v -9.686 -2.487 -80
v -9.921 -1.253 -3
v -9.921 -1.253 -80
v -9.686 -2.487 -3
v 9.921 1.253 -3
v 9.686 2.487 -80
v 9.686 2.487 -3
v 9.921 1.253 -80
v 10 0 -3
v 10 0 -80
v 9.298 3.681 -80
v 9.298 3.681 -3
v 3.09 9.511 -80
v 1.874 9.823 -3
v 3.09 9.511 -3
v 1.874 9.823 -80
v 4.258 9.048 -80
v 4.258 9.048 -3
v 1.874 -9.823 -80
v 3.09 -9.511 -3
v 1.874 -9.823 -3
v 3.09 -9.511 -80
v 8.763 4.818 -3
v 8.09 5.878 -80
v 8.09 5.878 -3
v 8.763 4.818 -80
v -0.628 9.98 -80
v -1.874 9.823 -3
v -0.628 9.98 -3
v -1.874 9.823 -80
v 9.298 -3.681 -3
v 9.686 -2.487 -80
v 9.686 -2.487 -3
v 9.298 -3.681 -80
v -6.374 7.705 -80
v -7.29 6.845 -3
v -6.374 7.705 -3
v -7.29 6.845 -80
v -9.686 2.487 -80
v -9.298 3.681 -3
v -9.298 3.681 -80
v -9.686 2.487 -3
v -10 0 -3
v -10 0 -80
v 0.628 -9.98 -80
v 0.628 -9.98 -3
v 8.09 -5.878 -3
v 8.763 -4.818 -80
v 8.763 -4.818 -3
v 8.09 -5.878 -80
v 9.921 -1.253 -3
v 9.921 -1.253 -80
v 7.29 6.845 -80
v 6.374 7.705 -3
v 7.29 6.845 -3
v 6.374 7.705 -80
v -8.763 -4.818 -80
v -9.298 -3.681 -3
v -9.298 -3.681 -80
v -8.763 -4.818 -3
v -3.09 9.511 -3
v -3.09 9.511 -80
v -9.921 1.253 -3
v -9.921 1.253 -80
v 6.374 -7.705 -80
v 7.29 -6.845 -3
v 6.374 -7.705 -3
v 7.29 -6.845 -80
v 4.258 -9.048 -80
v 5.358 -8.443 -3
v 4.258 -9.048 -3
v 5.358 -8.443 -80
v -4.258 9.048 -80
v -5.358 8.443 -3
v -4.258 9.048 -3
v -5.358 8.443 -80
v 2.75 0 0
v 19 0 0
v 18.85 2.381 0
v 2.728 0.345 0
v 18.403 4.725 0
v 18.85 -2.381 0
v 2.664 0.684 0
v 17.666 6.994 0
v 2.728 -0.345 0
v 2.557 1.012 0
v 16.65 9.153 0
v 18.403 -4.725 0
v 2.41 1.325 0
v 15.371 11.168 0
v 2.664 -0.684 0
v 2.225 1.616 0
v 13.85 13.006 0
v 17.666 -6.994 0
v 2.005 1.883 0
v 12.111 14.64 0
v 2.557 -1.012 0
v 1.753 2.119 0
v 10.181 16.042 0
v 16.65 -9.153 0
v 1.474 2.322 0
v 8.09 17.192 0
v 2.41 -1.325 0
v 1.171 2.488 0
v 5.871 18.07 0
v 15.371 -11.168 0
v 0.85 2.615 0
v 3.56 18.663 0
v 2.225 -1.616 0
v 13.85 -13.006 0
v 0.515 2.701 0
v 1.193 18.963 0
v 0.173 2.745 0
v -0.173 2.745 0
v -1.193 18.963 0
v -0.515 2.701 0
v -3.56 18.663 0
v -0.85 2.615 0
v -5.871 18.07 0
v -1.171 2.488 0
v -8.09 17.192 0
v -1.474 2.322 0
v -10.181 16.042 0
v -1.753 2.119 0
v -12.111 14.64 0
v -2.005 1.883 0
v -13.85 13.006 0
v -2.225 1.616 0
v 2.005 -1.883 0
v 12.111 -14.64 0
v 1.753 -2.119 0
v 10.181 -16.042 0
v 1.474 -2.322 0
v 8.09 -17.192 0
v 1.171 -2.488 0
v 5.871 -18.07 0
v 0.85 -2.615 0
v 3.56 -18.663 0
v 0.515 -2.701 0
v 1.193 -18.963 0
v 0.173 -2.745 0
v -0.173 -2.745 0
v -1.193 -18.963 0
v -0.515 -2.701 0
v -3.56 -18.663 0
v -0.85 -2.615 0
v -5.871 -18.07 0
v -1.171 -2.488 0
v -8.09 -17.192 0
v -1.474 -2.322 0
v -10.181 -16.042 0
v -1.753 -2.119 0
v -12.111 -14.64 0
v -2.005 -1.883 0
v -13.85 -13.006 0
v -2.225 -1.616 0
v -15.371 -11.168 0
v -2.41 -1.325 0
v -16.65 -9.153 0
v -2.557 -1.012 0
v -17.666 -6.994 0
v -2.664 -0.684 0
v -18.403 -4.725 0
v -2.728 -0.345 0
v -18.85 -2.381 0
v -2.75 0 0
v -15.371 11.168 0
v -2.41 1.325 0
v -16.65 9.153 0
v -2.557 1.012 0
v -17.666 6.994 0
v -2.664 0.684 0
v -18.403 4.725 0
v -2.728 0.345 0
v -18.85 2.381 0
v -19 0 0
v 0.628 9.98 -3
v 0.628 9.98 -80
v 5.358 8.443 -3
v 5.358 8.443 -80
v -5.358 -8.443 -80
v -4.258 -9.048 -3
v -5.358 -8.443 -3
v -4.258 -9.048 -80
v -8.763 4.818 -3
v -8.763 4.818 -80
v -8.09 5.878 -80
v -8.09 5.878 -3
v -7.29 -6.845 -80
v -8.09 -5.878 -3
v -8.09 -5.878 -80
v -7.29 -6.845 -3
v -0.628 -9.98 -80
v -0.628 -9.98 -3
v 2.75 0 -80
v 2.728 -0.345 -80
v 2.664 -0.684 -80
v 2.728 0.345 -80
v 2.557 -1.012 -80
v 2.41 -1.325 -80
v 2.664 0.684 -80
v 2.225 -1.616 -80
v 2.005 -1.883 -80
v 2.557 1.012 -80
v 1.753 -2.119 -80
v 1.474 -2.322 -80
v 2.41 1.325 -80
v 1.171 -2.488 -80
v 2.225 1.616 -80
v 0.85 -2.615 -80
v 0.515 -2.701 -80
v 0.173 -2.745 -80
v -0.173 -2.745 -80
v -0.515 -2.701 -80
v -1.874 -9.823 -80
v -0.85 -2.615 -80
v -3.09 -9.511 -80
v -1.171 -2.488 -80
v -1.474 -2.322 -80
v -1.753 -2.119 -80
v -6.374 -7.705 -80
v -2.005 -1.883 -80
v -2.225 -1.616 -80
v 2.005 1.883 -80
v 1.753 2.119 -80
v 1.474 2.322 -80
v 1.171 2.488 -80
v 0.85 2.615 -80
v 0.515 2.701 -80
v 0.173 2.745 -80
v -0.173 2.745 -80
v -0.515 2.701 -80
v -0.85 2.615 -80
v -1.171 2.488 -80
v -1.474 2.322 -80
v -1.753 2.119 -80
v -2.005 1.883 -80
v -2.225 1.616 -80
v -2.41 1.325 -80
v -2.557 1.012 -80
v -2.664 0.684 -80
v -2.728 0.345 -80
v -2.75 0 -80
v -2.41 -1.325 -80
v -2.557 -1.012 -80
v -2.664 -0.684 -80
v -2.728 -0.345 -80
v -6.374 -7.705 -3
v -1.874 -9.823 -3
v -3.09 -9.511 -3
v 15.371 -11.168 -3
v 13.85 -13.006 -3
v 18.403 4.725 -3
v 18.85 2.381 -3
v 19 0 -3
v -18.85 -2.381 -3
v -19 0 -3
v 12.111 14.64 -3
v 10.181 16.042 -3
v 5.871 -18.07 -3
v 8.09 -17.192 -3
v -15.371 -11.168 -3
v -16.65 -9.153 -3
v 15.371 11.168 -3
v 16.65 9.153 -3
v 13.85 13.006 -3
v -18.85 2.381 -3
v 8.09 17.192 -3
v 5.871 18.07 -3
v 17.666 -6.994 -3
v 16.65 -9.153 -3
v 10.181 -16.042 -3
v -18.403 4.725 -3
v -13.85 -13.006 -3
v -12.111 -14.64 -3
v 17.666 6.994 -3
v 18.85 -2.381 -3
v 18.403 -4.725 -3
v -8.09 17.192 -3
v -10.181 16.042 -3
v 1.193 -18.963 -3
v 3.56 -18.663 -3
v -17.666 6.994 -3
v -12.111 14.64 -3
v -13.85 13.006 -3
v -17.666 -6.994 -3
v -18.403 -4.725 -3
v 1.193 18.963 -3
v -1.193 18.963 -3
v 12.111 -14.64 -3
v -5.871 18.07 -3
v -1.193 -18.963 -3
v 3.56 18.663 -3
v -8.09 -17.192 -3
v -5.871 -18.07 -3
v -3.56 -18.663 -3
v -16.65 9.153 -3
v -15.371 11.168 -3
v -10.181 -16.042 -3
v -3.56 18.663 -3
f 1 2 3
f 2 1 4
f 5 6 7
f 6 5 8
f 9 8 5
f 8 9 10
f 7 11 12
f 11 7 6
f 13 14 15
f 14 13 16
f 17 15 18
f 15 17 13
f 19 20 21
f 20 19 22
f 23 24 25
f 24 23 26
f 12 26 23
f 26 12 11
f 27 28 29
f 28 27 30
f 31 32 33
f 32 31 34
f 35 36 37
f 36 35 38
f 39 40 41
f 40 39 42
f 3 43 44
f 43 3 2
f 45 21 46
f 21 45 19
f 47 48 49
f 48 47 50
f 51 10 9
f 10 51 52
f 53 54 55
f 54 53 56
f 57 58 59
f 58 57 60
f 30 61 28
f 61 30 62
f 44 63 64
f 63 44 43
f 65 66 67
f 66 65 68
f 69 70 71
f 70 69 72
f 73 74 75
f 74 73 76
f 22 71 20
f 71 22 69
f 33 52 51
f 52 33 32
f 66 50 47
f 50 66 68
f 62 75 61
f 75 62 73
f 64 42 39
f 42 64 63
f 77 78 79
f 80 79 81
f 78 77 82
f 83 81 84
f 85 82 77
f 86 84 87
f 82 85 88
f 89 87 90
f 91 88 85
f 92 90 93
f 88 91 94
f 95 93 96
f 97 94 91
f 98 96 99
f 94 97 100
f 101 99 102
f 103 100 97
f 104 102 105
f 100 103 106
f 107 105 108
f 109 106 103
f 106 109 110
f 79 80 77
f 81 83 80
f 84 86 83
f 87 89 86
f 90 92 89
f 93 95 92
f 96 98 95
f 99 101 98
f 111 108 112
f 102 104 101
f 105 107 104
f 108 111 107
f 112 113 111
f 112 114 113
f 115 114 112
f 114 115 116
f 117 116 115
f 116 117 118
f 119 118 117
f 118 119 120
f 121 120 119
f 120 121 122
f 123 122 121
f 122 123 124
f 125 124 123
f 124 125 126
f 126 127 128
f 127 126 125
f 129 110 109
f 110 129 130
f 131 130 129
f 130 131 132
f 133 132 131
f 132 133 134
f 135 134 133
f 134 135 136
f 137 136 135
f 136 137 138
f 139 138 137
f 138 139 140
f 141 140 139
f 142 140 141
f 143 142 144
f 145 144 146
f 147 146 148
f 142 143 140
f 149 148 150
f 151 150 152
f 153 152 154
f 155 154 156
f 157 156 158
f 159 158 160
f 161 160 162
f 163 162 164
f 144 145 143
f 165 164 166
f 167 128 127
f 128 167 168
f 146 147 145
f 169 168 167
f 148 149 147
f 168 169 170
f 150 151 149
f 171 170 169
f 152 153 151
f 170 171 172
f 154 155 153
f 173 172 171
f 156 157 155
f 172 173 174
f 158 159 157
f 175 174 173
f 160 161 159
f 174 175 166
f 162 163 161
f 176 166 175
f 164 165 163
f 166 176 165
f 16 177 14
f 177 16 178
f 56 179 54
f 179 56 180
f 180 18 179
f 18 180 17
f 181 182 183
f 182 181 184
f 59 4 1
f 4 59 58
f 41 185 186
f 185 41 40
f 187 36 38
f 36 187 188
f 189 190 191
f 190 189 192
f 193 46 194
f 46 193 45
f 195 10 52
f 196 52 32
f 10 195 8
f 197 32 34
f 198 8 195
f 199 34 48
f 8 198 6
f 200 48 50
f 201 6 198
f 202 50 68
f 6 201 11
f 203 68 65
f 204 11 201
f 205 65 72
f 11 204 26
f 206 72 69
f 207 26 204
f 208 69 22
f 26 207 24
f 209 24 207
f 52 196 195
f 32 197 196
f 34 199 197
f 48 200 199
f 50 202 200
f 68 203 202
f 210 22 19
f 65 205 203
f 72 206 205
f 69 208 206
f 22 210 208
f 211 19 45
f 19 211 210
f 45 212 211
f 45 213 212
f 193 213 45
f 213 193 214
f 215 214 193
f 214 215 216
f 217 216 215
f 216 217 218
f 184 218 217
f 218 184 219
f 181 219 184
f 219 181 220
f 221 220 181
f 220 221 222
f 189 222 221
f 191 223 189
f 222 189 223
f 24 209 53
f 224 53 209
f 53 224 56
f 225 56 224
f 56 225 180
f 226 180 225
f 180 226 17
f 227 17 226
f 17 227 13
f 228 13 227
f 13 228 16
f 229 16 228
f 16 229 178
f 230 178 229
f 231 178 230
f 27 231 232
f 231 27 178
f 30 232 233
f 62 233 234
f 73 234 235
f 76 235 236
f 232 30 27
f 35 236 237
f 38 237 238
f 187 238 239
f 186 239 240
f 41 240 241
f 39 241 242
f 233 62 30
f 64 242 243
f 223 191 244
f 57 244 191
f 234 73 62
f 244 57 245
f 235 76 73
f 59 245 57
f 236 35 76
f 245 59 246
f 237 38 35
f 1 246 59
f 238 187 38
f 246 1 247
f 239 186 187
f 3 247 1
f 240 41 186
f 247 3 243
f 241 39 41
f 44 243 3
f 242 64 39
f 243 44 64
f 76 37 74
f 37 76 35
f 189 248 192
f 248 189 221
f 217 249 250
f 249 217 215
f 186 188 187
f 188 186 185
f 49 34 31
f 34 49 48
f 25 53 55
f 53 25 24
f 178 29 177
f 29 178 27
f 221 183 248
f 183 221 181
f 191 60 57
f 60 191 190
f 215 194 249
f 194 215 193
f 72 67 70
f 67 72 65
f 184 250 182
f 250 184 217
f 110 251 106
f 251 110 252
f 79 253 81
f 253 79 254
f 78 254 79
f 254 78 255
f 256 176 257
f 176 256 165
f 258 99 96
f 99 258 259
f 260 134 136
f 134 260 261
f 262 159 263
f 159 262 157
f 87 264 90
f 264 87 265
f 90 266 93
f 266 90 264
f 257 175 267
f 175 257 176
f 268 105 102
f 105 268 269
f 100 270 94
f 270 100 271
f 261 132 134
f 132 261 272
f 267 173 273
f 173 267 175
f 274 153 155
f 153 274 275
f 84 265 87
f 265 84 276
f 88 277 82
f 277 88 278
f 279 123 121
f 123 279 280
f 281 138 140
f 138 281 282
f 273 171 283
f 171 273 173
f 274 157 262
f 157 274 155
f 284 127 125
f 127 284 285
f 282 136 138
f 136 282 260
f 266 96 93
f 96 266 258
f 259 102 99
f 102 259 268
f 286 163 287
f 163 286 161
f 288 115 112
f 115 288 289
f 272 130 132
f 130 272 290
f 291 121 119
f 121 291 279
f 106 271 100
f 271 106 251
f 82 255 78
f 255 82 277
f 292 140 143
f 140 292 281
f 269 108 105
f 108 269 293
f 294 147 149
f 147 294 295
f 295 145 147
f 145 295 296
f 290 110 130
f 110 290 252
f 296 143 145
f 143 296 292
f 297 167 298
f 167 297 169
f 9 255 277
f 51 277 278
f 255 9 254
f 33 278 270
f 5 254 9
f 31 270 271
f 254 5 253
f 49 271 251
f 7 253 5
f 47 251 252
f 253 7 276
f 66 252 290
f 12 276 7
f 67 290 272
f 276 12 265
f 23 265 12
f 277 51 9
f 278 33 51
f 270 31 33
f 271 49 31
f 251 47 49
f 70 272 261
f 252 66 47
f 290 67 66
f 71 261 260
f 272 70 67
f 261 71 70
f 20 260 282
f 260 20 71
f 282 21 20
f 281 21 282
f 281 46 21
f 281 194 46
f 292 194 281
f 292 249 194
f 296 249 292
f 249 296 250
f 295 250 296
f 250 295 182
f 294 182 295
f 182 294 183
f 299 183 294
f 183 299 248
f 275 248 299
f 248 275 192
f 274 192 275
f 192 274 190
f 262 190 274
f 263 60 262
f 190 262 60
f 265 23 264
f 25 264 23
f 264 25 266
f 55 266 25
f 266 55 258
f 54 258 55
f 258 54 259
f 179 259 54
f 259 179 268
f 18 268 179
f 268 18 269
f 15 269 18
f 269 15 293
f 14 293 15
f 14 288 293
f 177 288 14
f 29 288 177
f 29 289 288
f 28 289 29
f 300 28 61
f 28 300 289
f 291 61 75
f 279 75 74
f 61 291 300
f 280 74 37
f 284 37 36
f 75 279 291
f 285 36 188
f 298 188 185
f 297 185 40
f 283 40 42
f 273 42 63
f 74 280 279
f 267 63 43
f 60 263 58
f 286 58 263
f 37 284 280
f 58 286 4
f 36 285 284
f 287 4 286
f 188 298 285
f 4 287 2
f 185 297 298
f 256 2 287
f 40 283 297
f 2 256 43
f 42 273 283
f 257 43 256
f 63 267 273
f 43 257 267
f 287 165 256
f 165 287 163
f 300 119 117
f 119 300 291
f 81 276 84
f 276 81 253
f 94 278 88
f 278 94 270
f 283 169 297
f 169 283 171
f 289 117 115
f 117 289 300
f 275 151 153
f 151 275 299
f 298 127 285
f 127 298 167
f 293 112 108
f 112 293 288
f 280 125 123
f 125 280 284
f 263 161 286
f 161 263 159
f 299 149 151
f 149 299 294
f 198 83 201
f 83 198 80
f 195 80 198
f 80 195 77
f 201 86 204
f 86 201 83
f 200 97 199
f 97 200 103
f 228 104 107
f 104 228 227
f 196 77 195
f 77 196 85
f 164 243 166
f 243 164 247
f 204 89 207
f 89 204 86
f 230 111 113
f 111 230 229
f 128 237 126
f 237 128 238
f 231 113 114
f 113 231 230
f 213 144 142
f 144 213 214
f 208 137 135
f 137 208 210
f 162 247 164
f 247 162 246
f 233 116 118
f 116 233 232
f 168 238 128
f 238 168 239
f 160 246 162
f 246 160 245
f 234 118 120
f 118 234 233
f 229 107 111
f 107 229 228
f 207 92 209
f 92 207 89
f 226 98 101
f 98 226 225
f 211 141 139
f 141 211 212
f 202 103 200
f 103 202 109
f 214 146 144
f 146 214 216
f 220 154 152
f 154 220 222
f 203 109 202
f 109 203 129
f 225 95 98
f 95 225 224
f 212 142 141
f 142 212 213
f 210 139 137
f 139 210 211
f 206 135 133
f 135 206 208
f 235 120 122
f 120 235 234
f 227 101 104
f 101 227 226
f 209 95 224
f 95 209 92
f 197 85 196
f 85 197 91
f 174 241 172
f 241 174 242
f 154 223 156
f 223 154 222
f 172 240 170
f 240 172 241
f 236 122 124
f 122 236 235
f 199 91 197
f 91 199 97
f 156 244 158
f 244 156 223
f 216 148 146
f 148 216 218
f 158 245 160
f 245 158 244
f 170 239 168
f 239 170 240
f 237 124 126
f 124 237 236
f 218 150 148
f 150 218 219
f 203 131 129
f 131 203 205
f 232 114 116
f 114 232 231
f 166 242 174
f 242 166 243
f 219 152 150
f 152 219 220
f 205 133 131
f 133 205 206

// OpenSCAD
$fn = 50;


difference() {
	union() {
		translate(v = [0, 0, -80.0000000000]) {
			cylinder(h = 80, r = 10.0000000000);
		}
		translate(v = [0, 0, -3.0000000000]) {
			cylinder(h = 3, r = 19.0000000000);
		}
	}
	union() {
		#translate(v = [0, 0, -80]) {
			cylinder(h = 80, r = 2.7500000000);
		}
	}
}
